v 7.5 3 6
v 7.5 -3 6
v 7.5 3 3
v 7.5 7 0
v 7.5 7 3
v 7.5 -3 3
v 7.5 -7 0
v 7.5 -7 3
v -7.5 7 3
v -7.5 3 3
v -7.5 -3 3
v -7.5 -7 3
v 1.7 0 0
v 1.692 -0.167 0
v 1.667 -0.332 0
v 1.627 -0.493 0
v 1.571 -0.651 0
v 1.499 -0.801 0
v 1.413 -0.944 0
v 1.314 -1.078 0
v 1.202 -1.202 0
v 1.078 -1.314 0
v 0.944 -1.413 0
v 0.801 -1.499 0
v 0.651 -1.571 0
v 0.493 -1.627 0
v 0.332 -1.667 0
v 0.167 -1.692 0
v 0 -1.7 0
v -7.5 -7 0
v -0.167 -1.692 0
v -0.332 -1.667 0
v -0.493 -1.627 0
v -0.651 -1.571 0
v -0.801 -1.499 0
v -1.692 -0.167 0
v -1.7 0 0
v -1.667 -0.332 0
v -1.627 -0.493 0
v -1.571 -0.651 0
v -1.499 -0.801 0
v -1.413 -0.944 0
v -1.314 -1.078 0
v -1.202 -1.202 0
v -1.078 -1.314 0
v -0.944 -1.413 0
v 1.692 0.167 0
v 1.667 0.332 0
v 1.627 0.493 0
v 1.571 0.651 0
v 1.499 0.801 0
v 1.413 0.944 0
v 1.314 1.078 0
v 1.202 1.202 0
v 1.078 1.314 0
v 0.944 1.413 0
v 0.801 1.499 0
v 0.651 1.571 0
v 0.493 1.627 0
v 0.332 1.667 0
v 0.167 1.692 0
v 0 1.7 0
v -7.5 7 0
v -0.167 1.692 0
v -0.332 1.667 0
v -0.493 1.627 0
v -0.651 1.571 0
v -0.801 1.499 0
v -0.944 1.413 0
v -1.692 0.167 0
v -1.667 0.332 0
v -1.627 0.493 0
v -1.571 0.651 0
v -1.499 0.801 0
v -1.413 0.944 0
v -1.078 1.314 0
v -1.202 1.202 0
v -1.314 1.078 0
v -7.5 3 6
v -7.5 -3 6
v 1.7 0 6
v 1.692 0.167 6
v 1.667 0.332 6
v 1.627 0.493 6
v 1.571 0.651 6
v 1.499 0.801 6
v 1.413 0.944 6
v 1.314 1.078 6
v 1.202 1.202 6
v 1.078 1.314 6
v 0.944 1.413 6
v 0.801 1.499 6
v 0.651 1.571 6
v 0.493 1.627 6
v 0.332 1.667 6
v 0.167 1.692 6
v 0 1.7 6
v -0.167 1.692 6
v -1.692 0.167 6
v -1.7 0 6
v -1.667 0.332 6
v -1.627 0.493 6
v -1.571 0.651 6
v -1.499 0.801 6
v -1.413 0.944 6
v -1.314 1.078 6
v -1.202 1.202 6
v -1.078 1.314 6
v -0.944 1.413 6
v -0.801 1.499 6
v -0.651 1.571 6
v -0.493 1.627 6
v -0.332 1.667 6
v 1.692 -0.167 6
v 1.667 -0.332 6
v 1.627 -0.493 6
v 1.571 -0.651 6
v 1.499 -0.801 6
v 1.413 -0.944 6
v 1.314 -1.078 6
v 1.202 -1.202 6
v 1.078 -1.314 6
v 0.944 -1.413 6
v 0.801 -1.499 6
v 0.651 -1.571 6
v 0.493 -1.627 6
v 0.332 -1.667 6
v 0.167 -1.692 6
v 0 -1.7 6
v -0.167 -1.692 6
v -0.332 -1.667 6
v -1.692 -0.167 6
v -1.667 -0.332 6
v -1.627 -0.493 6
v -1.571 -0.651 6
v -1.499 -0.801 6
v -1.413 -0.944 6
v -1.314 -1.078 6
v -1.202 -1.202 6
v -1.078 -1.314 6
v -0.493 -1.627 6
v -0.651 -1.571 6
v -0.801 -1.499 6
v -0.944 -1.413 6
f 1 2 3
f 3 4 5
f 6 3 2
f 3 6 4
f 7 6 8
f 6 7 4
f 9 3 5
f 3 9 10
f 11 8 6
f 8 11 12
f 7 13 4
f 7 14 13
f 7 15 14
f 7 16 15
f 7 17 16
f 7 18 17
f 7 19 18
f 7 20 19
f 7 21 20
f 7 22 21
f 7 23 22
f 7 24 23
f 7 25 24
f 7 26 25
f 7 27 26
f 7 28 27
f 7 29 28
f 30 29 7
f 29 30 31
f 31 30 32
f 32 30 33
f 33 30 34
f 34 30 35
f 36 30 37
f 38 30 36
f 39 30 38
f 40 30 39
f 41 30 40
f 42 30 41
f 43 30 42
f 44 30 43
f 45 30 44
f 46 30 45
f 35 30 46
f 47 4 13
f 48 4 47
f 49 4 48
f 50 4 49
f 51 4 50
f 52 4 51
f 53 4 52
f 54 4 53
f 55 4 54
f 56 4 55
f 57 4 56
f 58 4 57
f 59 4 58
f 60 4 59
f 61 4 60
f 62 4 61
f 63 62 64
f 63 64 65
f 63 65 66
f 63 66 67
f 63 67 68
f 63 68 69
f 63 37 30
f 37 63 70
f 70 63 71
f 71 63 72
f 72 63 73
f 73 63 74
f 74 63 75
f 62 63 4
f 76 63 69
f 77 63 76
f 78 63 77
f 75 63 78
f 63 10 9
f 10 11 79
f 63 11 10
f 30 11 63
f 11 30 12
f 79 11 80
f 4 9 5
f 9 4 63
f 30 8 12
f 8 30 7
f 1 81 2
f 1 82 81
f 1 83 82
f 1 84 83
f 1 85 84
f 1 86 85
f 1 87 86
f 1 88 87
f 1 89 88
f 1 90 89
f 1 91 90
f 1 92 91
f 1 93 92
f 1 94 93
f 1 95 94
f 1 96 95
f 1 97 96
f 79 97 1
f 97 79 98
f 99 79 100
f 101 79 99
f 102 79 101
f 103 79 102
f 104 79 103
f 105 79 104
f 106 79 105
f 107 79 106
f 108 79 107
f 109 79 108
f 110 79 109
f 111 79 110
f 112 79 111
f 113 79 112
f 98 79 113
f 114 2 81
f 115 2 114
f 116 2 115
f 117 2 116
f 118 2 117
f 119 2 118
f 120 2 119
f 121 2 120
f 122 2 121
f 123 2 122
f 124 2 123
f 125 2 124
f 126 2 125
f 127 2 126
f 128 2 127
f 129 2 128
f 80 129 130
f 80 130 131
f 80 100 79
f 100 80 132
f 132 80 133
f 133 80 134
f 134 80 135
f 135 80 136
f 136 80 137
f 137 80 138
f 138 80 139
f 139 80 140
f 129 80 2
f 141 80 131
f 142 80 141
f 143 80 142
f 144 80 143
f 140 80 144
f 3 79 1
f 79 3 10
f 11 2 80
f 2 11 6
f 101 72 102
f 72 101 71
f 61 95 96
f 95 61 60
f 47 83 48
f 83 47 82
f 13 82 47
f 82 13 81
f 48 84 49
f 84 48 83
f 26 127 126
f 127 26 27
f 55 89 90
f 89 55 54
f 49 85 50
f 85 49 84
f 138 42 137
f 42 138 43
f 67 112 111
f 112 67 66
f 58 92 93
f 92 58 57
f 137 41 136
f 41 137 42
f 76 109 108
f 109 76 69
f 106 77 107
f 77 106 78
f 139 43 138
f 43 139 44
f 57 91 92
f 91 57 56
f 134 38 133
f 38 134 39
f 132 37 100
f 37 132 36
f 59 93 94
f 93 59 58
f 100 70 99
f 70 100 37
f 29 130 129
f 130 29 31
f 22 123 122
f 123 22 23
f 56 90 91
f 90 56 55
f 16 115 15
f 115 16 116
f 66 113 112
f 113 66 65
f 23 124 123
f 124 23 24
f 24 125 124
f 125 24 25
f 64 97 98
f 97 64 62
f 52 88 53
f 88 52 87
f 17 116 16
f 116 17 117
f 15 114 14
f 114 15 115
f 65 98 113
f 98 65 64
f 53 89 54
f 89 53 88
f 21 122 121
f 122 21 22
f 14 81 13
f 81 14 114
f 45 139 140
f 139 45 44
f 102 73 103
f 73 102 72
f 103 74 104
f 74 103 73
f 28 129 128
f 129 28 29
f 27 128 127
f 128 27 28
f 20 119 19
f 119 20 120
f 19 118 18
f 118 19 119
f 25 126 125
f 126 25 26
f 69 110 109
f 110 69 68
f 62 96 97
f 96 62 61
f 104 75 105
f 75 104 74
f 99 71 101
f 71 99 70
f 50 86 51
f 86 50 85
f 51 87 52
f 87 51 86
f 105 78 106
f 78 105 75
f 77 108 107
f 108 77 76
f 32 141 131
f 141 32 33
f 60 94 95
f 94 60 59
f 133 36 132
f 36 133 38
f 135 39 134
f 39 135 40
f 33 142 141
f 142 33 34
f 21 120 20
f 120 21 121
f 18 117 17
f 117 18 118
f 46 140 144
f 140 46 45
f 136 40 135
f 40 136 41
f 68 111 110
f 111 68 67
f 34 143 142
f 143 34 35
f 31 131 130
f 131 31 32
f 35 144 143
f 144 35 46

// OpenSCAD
// T-slot nut for aluminium extrusion
// Print orientation: flange down on the bed (z = 0), neck building upward

$fn = 64;

// ---- Dimensions (mm) ----
nut_length     = 15;    // length along X
flange_width   = 14;    // bottom flange width (Y)
flange_height  = 3;     // flange thickness, z = 0 .. 3
neck_width     = 6;     // centred neck width (Y)
total_height   = 6;     // top of neck (z)
hole_d         = 3.4;   // vertical screw clearance hole diameter
eps            = 0.5;   // overshoot for clean boolean cuts

neck_height = total_height - flange_height;  // neck height above flange

difference() {
    union() {
        // Bottom flange
        translate([-nut_length/2, -flange_width/2, 0])
            cube([nut_length, flange_width, flange_height]);

        // Centred neck (slightly overlapping flange to ensure a single solid)
        translate([-nut_length/2, -neck_width/2, flange_height - 0.01])
            cube([nut_length, neck_width, neck_height + 0.01]);
    }

    // Vertical screw hole through the centre
    translate([0, 0, -eps])
        cylinder(d = hole_d, h = total_height + 2*eps, $fn = 64);
}
